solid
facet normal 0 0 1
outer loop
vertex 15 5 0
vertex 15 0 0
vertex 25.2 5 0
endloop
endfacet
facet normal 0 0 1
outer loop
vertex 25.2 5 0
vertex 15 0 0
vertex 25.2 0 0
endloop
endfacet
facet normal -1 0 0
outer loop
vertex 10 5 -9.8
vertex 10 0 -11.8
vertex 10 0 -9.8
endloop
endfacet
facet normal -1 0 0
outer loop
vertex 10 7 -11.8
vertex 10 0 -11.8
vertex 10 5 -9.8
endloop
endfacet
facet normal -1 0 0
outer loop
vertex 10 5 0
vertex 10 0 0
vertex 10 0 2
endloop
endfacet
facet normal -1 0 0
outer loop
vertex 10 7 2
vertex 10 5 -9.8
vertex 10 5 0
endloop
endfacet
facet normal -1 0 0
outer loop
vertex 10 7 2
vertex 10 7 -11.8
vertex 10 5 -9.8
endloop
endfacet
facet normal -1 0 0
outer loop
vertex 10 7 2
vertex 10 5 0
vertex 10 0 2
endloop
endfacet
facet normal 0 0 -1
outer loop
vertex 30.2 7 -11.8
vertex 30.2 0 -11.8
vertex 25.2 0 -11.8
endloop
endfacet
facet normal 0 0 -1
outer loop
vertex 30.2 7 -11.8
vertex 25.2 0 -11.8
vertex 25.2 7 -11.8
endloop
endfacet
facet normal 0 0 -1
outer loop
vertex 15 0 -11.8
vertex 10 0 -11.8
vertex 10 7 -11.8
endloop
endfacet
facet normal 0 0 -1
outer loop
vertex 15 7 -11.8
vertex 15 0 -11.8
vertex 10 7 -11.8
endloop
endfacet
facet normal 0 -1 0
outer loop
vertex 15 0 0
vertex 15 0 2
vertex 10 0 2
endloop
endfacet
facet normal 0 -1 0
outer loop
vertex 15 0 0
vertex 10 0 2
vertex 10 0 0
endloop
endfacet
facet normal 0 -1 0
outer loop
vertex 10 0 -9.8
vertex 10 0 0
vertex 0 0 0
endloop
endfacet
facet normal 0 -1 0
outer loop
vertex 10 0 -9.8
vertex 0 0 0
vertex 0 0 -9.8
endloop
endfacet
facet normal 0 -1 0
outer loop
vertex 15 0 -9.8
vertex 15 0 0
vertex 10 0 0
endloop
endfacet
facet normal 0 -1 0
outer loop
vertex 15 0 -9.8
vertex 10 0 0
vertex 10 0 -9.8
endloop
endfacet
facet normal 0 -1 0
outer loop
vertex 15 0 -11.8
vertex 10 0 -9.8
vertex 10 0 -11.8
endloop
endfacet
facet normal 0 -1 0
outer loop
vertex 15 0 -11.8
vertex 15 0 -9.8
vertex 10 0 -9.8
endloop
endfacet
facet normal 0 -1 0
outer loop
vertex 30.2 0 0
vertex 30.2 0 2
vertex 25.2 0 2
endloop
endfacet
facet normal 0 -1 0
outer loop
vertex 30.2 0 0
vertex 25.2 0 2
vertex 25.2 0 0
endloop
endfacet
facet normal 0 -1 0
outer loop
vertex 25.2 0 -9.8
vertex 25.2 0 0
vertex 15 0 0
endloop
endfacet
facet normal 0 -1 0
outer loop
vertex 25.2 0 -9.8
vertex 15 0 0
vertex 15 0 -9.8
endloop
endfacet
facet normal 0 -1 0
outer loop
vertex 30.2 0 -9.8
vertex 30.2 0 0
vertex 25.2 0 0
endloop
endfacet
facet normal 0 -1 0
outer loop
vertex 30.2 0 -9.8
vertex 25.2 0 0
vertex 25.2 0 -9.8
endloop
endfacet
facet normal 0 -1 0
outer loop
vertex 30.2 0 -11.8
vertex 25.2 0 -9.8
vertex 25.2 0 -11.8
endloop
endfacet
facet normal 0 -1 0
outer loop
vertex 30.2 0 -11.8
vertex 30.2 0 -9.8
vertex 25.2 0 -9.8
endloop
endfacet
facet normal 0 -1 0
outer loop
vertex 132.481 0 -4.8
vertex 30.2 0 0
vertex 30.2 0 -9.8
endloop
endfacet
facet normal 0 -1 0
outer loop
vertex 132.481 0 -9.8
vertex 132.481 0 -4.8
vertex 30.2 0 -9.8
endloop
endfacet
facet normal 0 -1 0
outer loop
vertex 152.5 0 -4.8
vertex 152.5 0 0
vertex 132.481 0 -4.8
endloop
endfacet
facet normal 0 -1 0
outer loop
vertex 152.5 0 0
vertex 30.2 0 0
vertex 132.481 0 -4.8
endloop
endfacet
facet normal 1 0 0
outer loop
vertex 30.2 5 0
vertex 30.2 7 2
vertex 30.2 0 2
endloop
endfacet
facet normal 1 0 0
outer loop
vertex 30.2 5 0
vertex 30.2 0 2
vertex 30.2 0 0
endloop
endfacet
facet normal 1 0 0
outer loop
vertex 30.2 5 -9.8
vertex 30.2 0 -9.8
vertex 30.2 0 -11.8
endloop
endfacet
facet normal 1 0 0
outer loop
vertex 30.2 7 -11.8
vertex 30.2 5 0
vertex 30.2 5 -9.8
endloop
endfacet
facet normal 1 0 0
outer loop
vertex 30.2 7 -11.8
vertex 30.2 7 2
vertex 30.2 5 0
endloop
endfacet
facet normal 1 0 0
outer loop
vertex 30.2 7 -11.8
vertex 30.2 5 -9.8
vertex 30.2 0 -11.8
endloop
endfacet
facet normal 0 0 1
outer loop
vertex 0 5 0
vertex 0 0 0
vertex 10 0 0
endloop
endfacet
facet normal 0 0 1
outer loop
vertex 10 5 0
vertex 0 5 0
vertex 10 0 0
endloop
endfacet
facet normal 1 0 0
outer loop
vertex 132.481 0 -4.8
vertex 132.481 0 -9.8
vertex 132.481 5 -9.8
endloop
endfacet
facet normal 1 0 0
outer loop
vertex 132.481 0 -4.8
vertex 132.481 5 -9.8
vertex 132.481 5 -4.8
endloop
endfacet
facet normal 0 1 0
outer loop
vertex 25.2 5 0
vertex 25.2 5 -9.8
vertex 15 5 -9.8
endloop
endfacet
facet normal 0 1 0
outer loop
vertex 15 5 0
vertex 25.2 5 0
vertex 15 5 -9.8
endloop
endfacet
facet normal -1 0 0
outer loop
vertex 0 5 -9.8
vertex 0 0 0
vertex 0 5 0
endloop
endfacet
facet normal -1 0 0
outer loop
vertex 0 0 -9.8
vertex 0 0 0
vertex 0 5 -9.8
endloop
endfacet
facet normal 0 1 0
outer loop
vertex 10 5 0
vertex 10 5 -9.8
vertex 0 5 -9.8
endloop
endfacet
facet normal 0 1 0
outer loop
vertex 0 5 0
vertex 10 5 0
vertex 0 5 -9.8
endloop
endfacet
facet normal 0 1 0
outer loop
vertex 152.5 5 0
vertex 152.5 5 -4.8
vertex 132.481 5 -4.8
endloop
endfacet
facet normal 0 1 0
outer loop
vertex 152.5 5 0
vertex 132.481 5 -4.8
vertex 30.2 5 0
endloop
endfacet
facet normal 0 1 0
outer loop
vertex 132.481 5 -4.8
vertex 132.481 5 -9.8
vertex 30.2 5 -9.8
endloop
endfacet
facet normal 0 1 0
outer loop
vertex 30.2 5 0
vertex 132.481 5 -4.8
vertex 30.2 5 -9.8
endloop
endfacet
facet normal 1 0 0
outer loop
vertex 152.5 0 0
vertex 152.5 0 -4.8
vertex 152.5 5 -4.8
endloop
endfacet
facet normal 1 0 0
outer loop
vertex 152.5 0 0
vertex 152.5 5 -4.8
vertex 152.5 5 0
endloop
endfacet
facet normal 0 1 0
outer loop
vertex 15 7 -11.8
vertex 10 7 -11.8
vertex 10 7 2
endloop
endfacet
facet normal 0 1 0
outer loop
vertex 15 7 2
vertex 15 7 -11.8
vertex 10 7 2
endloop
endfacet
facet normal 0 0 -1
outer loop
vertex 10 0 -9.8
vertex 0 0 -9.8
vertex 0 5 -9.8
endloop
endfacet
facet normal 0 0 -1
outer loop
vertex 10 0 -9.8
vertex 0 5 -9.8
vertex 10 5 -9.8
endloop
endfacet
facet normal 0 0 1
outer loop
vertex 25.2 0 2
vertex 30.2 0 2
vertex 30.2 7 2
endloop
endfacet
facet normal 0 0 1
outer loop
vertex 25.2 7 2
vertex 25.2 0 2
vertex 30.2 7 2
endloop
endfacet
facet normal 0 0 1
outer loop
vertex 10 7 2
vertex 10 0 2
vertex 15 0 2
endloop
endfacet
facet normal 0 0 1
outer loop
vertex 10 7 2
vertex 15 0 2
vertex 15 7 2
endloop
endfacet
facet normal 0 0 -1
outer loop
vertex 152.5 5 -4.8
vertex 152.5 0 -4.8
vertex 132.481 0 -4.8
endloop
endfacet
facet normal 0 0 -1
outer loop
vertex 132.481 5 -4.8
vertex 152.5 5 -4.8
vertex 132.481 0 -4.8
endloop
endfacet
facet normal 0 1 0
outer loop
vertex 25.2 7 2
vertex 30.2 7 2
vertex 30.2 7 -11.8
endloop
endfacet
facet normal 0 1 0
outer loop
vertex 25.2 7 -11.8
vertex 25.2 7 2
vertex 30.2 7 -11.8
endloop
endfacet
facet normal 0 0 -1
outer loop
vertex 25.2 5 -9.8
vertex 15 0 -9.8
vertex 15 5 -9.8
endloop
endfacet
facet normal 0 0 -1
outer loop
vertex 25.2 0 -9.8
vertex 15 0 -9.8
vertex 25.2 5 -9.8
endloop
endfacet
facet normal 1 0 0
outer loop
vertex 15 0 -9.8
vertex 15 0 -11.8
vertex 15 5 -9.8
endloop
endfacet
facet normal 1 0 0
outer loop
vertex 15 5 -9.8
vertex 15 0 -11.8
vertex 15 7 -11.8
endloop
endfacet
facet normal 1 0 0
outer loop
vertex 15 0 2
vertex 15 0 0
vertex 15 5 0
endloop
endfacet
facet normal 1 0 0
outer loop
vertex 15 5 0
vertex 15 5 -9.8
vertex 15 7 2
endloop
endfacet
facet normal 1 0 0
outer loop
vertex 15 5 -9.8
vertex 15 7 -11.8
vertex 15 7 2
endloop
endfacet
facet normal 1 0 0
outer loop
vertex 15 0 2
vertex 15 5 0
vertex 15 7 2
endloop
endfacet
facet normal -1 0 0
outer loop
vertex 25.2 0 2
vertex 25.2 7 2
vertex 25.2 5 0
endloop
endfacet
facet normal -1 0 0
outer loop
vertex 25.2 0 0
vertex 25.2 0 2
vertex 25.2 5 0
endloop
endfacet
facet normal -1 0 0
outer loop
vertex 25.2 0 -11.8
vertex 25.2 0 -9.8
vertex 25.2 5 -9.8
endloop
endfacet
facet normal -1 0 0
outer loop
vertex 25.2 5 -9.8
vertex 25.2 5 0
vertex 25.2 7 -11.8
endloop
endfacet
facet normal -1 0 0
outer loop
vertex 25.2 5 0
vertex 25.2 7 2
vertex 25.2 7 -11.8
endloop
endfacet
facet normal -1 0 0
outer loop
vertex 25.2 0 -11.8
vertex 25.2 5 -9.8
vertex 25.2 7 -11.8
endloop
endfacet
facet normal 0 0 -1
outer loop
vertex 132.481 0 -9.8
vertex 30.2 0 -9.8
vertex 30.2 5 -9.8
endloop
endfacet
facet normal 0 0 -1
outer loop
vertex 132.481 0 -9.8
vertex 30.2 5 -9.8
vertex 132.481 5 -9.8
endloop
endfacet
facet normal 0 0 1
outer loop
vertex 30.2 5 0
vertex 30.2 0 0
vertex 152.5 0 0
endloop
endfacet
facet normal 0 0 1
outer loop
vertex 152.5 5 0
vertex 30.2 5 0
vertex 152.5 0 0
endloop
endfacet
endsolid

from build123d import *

# Parameters (mm, degrees)
BOSS_EXTRUDE1_DEPTH = 5
SKETCH2_W           = 13.8
SKETCH2_H           = 7
BOSS_EXTRUDE2_DEPTH = 5
SKETCH3_W           = 13.8
SKETCH3_H           = 7
BOSS_EXTRUDE3_DEPTH = 5


with BuildPart() as part:
    # Sketch1 → Boss-Extrude1 (new body)
    with BuildSketch(Plane(origin=(0, 0, 0), x_dir=(1, 0, 0), z_dir=(0, 1, 0))):
        Polygon((132.481495242, 9.8), (132.481495242, 4.8), (142.481495242, 4.8), (152.5, 4.8), (152.5, 0), (142.5, 0), (0, 0), (0, 9.8), align=None)
    extrude(amount=BOSS_EXTRUDE1_DEPTH)

    # Sketch2 → Boss-Extrude2 (add)
    with BuildSketch(Plane.ZY.offset(-10)):
        with Locations((-4.9, 3.5)):
            Rectangle(SKETCH2_W, SKETCH2_H)
    extrude(amount=-BOSS_EXTRUDE2_DEPTH)

    # Sketch3 → Boss-Extrude3 (add)
    with BuildSketch(Plane(origin=(30.2, 0, 0), x_dir=(0, 0, -1), z_dir=(1, 0, 0))):
        with Locations((4.9, 3.5)):
            Rectangle(SKETCH3_W, SKETCH3_H)
    extrude(amount=-BOSS_EXTRUDE3_DEPTH)


solid = part.part
